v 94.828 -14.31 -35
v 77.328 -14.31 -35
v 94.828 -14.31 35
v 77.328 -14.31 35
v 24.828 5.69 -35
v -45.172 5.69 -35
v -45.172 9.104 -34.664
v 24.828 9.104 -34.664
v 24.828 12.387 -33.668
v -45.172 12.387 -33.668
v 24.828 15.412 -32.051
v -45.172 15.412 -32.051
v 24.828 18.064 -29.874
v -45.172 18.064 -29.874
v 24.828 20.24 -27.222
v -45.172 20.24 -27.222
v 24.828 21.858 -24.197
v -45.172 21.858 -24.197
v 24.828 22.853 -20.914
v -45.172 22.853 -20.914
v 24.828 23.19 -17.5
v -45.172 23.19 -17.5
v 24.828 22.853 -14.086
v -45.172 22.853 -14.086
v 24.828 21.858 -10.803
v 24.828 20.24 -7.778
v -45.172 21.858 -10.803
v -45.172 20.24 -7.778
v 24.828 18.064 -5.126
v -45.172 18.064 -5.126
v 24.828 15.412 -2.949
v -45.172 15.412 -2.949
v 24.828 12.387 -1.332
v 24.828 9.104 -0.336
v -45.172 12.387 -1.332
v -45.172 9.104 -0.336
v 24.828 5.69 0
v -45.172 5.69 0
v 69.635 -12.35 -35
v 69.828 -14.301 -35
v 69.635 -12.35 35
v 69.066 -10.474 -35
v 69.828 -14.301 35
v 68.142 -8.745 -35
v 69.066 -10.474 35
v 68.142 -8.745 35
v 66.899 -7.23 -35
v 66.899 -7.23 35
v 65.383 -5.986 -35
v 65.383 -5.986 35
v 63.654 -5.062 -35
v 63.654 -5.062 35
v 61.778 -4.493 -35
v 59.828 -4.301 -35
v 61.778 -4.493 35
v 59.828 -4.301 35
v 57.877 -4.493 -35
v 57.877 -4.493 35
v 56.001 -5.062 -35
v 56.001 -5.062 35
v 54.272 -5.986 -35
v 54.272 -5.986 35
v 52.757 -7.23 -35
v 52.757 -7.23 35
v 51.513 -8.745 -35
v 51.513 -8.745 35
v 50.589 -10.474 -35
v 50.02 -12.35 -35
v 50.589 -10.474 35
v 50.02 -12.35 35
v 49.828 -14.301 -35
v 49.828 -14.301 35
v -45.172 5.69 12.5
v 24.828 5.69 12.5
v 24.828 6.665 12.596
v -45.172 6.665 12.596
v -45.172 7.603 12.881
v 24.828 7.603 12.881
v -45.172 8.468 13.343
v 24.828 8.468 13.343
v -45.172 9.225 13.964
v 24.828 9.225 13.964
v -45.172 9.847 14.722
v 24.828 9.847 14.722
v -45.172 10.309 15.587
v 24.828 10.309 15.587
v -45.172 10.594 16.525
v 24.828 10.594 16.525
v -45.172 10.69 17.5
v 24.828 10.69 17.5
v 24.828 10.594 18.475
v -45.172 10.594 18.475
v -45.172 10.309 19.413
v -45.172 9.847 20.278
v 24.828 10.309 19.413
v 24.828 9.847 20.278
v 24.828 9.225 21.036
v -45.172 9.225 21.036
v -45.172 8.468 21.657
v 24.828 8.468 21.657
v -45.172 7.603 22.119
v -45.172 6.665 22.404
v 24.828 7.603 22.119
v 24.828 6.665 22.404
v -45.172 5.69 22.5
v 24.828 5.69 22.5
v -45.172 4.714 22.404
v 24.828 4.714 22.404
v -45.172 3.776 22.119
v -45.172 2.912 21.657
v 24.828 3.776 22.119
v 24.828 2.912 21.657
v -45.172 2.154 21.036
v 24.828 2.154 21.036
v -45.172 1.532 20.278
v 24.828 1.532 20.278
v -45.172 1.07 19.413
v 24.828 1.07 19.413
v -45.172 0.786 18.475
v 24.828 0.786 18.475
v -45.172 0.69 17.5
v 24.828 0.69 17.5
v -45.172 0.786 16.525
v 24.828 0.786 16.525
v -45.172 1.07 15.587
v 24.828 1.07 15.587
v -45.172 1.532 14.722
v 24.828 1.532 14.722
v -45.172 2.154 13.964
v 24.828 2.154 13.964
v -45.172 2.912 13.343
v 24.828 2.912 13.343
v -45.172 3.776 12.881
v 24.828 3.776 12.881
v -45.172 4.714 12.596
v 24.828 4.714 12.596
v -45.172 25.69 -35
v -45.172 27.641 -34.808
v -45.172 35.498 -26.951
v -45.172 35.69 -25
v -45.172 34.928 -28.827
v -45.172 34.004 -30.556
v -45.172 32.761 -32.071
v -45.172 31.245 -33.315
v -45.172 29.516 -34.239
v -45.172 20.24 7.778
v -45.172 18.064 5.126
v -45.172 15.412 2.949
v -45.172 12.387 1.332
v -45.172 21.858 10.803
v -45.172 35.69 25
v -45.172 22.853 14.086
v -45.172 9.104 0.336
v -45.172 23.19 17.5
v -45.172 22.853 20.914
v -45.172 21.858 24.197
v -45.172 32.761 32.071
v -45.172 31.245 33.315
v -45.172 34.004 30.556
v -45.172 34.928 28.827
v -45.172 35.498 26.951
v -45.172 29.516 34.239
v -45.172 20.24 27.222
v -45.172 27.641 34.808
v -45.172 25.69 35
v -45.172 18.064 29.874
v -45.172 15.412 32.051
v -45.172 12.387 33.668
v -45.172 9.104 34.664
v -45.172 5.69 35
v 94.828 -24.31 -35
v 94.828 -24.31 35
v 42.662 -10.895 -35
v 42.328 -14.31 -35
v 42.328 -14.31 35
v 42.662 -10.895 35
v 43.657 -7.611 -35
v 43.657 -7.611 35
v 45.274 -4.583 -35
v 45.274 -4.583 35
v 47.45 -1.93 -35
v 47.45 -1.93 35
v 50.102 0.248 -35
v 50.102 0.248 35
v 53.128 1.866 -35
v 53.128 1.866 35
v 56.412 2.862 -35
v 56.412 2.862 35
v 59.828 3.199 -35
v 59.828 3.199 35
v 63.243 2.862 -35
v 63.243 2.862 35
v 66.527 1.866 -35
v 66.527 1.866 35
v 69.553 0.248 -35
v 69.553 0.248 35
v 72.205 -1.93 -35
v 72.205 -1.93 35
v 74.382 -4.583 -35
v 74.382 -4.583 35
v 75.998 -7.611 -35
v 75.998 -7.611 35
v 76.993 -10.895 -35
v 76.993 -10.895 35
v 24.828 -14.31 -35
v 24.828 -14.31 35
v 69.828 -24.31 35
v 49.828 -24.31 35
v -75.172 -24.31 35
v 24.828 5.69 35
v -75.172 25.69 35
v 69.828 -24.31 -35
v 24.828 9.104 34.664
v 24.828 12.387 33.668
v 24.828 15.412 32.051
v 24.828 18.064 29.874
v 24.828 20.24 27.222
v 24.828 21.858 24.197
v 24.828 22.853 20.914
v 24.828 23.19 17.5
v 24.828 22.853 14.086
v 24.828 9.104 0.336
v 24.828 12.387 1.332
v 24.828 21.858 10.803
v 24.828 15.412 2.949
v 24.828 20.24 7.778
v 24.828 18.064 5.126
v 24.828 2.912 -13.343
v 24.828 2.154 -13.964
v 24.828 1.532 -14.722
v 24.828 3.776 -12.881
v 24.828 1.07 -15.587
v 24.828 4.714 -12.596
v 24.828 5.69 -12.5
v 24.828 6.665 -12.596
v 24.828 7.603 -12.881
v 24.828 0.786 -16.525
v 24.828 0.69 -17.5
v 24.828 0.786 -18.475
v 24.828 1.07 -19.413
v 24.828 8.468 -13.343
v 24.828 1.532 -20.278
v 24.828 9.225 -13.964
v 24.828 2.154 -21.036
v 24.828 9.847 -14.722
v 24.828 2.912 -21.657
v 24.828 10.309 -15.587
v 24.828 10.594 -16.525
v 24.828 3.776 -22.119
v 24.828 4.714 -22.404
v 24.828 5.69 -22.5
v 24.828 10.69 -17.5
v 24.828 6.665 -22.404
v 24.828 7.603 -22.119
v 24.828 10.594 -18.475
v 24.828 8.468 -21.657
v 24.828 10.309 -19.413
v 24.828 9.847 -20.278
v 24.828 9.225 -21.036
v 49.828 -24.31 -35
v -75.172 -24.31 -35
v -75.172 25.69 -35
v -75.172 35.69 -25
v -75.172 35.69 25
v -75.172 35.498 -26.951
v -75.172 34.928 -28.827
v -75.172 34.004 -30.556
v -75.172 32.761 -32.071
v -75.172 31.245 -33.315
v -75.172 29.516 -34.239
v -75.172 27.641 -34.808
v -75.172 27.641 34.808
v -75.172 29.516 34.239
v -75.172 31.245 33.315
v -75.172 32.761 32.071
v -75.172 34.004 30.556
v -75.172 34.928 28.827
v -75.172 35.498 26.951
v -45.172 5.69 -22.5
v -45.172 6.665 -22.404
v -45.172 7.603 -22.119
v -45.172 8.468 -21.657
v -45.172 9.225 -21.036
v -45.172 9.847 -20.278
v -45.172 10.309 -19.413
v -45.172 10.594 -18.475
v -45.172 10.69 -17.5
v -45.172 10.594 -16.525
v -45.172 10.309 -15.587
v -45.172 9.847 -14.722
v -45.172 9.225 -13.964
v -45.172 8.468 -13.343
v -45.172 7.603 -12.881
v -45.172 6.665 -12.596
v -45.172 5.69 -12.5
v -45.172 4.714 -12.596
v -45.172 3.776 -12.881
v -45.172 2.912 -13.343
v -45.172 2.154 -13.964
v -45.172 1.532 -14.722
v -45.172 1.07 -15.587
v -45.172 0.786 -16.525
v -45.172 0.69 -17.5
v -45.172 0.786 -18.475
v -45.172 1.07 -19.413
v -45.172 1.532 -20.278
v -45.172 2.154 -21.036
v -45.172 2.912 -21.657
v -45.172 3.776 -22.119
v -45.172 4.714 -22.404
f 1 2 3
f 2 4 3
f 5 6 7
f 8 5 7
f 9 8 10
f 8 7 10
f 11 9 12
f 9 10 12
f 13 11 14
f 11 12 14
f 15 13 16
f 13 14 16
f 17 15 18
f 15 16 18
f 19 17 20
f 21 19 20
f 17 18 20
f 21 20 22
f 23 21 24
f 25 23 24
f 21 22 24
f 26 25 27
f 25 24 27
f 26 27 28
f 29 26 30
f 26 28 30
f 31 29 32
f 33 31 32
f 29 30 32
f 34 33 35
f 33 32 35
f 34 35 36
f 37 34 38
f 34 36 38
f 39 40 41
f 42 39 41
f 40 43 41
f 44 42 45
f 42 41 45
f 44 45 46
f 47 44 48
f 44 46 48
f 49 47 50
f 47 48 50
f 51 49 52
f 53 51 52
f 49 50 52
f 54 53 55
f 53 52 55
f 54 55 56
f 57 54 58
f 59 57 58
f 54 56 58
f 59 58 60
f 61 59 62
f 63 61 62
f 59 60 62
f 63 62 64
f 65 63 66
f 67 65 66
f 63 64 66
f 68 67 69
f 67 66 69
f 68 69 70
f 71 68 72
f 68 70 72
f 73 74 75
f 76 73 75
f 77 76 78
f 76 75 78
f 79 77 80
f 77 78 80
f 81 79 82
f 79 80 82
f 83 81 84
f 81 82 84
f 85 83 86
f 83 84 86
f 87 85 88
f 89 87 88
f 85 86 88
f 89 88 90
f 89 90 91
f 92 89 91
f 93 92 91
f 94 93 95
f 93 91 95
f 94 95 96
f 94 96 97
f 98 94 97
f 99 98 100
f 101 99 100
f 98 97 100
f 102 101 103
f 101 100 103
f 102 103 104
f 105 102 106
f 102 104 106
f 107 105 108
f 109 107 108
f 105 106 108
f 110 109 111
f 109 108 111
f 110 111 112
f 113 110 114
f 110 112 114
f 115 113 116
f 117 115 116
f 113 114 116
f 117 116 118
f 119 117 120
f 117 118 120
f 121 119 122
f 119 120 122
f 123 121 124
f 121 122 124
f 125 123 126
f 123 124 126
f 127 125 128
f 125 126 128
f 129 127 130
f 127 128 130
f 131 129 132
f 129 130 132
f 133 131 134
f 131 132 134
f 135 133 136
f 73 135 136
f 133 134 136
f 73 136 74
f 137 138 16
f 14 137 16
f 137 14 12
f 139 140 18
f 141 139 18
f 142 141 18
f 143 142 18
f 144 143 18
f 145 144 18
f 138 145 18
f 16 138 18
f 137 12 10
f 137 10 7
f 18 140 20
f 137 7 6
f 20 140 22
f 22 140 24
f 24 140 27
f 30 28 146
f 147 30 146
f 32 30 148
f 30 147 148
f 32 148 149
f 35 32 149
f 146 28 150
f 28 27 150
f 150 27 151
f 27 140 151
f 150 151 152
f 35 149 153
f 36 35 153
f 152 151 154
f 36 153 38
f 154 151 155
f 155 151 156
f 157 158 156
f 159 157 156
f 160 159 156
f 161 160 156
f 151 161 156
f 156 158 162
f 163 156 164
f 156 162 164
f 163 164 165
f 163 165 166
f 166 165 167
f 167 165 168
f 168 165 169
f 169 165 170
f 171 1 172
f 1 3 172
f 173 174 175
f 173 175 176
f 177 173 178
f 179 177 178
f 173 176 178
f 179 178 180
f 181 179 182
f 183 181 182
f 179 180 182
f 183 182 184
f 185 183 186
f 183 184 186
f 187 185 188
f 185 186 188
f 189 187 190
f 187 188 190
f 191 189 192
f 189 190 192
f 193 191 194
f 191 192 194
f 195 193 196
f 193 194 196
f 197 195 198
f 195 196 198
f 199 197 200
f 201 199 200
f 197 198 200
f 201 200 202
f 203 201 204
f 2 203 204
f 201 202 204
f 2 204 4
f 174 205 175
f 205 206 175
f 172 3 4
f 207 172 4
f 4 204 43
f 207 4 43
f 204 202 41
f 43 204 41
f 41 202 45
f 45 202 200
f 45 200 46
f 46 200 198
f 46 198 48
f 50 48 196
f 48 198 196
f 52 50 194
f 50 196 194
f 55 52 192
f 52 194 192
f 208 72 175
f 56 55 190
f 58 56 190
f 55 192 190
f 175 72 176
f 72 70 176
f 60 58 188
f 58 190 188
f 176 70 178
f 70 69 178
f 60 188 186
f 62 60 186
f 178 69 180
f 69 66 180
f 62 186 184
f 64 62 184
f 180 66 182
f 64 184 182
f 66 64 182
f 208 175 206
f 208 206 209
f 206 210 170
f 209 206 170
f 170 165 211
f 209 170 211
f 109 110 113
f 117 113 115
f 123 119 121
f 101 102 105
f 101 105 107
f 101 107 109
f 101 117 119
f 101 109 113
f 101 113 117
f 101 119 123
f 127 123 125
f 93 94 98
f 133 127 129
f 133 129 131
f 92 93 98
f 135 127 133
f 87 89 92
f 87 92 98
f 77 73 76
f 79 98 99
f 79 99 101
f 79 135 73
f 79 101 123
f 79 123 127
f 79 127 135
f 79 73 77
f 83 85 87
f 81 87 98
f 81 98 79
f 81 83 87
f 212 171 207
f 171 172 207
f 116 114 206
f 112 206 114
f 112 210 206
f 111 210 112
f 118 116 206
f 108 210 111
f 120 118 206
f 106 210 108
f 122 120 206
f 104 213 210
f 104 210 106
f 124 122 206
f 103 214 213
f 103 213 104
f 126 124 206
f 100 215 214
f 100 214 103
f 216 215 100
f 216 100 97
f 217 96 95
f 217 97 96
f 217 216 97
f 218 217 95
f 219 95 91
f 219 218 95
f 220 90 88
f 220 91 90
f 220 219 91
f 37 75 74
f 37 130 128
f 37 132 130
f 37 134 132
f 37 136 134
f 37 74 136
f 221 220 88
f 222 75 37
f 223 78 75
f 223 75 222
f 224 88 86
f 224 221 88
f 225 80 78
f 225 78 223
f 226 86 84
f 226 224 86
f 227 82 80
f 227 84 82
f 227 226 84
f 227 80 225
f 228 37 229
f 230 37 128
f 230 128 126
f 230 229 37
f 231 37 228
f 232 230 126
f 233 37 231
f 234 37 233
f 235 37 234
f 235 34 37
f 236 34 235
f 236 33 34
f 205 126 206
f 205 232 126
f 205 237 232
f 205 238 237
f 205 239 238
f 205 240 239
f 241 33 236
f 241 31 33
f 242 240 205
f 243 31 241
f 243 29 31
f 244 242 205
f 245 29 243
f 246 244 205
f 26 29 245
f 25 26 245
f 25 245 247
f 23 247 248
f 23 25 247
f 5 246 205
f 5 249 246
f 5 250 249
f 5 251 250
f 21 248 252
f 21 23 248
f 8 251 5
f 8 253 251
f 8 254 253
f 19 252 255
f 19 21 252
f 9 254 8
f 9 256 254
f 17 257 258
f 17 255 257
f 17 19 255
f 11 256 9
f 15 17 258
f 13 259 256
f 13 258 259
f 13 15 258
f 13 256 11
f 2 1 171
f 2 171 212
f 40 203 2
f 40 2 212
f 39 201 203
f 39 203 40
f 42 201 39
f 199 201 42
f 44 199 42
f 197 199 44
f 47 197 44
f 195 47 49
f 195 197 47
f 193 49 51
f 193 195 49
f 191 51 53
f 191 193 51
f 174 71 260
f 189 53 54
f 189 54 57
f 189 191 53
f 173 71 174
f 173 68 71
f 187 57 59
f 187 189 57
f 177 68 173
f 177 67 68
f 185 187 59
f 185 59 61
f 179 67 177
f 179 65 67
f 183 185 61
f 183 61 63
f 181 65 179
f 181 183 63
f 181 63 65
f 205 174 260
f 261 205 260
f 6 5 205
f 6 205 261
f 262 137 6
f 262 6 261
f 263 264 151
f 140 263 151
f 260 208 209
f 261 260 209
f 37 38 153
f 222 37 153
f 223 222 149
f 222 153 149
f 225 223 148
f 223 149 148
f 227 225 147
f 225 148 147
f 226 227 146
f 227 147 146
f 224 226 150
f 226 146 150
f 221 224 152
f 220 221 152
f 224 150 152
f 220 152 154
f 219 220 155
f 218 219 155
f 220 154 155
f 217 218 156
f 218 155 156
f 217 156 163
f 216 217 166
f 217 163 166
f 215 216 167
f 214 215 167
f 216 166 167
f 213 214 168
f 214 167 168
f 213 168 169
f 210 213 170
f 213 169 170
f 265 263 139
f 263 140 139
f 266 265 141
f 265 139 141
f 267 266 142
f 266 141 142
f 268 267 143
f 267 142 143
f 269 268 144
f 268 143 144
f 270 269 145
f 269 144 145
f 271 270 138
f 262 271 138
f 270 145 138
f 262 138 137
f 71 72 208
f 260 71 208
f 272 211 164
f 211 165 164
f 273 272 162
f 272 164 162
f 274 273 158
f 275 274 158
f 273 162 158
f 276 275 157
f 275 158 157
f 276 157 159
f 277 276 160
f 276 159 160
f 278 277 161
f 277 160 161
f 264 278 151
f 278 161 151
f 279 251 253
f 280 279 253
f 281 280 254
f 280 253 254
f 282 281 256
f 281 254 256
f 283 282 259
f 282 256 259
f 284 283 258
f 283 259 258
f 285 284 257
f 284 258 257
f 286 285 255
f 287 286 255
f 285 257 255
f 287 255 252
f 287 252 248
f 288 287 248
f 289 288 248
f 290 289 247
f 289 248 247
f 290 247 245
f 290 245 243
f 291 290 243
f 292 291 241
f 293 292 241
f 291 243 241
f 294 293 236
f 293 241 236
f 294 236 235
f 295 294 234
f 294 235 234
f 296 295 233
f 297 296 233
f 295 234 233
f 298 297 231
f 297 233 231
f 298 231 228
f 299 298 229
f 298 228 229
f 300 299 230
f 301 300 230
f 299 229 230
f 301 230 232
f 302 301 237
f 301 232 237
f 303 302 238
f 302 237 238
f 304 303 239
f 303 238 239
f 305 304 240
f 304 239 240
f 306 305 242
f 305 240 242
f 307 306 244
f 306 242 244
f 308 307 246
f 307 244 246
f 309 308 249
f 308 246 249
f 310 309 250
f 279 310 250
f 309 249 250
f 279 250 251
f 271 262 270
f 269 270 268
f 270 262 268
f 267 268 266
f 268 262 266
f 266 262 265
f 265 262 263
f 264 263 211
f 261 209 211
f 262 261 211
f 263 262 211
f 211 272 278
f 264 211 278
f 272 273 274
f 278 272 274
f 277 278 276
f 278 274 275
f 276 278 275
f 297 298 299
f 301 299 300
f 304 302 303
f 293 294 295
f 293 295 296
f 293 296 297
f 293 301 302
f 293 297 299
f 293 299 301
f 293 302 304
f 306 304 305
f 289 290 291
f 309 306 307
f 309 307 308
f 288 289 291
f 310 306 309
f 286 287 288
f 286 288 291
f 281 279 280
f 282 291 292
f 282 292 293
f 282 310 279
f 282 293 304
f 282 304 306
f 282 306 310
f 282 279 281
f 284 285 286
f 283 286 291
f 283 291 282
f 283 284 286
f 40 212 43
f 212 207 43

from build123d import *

# Parameters (mm, degrees)
BOSS_EXTRUDE1_DEPTH = 35
FILLET1_R           = 10
FILLET2_R           = 10
BOSS_EXTRUDE2_DEPTH = 70
SKETCH4_R           = 5
CUT_EXTRUDE1_DEPTH  = 70


with BuildPart() as part:
    # Sketch1 → Boss-Extrude1 (new body, symmetric)
    with BuildSketch(Plane.XY):
        with BuildLine():
            Line((-75.172413793, -24.310344828), (-75.172413793, 35.689655172))
            Line((-75.172413793, 35.689655172), (-45.172413793, 35.689655172))
            Line((-45.172413793, 35.689655172), (-45.172413793, 5.689655172))
            Line((-45.172413793, 5.689655172), (24.827586207, 5.689655172))
            Line((24.827586207, 5.689655172), (24.827586207, -14.310344828))
            Line((24.827586207, -14.310344828), (42.32758867, -14.310344828))
            ThreePointArc((42.32758867, -14.310344828), (59.827586207, 3.198940398), (77.327583744, -14.310344828))
            Line((77.327583744, -14.310344828), (94.827586207, -14.310344828))
            Line((94.827586207, -14.310344828), (94.827586207, -24.310344828))
            Line((94.827586207, -24.310344828), (69.827586207, -24.310344828))
            Line((69.827586207, -24.310344828), (69.827586207, -14.301059602))
            ThreePointArc((69.827586207, -14.301059602), (59.827586207, -4.301059602), (49.827586207, -14.301059602))
            Line((49.827586207, -14.301059602), (49.827586207, -24.310344828))
            Line((49.827586207, -24.310344828), (-75.172413793, -24.310344828))
        make_face()
    extrude(amount=BOSS_EXTRUDE1_DEPTH, both=True)

    # Fillet1
    fillet1_edges = [part.edges().sort_by_distance(p)[0] for p in [
        (-60.172413793, 35.689655172, 35),
    ]]
    fillet(fillet1_edges, radius=FILLET1_R)

    # Fillet2
    fillet2_edges = [part.edges().sort_by_distance(p)[0] for p in [
        (-60.172413793, 35.689655172, -35),
    ]]
    fillet(fillet2_edges, radius=FILLET2_R)

    # Sketch3 → Boss-Extrude2 (add)
    with BuildSketch(Plane(origin=(-45.172413793, 0, 0), x_dir=(0, 0, -1), z_dir=(1, 0, 0))):
        with BuildLine():
            ThreePointArc((0, 5.689655172), (-17.5, 23.189655172), (-35, 5.689655172))
            Line((-35, 5.689655172), (0, 5.689655172))
        make_face()
        with BuildLine():
            ThreePointArc((35, 5.689655172), (17.5, 23.189655172), (0, 5.689655172))
            Line((0, 5.689655172), (35, 5.689655172))
        make_face()
    extrude(amount=BOSS_EXTRUDE2_DEPTH)

    # Sketch4 → Cut-Extrude1 (cut)
    with BuildSketch(Plane(origin=(24.827586207, 0, 0), x_dir=(0, 0, -1), z_dir=(1, 0, 0))):
        with Locations((-17.5, 5.689655172)):
            Circle(SKETCH4_R)
        with Locations((17.5, 5.689655172)):
            Circle(SKETCH4_R)
    extrude(amount=-CUT_EXTRUDE1_DEPTH, mode=Mode.SUBTRACT)


solid = part.part
